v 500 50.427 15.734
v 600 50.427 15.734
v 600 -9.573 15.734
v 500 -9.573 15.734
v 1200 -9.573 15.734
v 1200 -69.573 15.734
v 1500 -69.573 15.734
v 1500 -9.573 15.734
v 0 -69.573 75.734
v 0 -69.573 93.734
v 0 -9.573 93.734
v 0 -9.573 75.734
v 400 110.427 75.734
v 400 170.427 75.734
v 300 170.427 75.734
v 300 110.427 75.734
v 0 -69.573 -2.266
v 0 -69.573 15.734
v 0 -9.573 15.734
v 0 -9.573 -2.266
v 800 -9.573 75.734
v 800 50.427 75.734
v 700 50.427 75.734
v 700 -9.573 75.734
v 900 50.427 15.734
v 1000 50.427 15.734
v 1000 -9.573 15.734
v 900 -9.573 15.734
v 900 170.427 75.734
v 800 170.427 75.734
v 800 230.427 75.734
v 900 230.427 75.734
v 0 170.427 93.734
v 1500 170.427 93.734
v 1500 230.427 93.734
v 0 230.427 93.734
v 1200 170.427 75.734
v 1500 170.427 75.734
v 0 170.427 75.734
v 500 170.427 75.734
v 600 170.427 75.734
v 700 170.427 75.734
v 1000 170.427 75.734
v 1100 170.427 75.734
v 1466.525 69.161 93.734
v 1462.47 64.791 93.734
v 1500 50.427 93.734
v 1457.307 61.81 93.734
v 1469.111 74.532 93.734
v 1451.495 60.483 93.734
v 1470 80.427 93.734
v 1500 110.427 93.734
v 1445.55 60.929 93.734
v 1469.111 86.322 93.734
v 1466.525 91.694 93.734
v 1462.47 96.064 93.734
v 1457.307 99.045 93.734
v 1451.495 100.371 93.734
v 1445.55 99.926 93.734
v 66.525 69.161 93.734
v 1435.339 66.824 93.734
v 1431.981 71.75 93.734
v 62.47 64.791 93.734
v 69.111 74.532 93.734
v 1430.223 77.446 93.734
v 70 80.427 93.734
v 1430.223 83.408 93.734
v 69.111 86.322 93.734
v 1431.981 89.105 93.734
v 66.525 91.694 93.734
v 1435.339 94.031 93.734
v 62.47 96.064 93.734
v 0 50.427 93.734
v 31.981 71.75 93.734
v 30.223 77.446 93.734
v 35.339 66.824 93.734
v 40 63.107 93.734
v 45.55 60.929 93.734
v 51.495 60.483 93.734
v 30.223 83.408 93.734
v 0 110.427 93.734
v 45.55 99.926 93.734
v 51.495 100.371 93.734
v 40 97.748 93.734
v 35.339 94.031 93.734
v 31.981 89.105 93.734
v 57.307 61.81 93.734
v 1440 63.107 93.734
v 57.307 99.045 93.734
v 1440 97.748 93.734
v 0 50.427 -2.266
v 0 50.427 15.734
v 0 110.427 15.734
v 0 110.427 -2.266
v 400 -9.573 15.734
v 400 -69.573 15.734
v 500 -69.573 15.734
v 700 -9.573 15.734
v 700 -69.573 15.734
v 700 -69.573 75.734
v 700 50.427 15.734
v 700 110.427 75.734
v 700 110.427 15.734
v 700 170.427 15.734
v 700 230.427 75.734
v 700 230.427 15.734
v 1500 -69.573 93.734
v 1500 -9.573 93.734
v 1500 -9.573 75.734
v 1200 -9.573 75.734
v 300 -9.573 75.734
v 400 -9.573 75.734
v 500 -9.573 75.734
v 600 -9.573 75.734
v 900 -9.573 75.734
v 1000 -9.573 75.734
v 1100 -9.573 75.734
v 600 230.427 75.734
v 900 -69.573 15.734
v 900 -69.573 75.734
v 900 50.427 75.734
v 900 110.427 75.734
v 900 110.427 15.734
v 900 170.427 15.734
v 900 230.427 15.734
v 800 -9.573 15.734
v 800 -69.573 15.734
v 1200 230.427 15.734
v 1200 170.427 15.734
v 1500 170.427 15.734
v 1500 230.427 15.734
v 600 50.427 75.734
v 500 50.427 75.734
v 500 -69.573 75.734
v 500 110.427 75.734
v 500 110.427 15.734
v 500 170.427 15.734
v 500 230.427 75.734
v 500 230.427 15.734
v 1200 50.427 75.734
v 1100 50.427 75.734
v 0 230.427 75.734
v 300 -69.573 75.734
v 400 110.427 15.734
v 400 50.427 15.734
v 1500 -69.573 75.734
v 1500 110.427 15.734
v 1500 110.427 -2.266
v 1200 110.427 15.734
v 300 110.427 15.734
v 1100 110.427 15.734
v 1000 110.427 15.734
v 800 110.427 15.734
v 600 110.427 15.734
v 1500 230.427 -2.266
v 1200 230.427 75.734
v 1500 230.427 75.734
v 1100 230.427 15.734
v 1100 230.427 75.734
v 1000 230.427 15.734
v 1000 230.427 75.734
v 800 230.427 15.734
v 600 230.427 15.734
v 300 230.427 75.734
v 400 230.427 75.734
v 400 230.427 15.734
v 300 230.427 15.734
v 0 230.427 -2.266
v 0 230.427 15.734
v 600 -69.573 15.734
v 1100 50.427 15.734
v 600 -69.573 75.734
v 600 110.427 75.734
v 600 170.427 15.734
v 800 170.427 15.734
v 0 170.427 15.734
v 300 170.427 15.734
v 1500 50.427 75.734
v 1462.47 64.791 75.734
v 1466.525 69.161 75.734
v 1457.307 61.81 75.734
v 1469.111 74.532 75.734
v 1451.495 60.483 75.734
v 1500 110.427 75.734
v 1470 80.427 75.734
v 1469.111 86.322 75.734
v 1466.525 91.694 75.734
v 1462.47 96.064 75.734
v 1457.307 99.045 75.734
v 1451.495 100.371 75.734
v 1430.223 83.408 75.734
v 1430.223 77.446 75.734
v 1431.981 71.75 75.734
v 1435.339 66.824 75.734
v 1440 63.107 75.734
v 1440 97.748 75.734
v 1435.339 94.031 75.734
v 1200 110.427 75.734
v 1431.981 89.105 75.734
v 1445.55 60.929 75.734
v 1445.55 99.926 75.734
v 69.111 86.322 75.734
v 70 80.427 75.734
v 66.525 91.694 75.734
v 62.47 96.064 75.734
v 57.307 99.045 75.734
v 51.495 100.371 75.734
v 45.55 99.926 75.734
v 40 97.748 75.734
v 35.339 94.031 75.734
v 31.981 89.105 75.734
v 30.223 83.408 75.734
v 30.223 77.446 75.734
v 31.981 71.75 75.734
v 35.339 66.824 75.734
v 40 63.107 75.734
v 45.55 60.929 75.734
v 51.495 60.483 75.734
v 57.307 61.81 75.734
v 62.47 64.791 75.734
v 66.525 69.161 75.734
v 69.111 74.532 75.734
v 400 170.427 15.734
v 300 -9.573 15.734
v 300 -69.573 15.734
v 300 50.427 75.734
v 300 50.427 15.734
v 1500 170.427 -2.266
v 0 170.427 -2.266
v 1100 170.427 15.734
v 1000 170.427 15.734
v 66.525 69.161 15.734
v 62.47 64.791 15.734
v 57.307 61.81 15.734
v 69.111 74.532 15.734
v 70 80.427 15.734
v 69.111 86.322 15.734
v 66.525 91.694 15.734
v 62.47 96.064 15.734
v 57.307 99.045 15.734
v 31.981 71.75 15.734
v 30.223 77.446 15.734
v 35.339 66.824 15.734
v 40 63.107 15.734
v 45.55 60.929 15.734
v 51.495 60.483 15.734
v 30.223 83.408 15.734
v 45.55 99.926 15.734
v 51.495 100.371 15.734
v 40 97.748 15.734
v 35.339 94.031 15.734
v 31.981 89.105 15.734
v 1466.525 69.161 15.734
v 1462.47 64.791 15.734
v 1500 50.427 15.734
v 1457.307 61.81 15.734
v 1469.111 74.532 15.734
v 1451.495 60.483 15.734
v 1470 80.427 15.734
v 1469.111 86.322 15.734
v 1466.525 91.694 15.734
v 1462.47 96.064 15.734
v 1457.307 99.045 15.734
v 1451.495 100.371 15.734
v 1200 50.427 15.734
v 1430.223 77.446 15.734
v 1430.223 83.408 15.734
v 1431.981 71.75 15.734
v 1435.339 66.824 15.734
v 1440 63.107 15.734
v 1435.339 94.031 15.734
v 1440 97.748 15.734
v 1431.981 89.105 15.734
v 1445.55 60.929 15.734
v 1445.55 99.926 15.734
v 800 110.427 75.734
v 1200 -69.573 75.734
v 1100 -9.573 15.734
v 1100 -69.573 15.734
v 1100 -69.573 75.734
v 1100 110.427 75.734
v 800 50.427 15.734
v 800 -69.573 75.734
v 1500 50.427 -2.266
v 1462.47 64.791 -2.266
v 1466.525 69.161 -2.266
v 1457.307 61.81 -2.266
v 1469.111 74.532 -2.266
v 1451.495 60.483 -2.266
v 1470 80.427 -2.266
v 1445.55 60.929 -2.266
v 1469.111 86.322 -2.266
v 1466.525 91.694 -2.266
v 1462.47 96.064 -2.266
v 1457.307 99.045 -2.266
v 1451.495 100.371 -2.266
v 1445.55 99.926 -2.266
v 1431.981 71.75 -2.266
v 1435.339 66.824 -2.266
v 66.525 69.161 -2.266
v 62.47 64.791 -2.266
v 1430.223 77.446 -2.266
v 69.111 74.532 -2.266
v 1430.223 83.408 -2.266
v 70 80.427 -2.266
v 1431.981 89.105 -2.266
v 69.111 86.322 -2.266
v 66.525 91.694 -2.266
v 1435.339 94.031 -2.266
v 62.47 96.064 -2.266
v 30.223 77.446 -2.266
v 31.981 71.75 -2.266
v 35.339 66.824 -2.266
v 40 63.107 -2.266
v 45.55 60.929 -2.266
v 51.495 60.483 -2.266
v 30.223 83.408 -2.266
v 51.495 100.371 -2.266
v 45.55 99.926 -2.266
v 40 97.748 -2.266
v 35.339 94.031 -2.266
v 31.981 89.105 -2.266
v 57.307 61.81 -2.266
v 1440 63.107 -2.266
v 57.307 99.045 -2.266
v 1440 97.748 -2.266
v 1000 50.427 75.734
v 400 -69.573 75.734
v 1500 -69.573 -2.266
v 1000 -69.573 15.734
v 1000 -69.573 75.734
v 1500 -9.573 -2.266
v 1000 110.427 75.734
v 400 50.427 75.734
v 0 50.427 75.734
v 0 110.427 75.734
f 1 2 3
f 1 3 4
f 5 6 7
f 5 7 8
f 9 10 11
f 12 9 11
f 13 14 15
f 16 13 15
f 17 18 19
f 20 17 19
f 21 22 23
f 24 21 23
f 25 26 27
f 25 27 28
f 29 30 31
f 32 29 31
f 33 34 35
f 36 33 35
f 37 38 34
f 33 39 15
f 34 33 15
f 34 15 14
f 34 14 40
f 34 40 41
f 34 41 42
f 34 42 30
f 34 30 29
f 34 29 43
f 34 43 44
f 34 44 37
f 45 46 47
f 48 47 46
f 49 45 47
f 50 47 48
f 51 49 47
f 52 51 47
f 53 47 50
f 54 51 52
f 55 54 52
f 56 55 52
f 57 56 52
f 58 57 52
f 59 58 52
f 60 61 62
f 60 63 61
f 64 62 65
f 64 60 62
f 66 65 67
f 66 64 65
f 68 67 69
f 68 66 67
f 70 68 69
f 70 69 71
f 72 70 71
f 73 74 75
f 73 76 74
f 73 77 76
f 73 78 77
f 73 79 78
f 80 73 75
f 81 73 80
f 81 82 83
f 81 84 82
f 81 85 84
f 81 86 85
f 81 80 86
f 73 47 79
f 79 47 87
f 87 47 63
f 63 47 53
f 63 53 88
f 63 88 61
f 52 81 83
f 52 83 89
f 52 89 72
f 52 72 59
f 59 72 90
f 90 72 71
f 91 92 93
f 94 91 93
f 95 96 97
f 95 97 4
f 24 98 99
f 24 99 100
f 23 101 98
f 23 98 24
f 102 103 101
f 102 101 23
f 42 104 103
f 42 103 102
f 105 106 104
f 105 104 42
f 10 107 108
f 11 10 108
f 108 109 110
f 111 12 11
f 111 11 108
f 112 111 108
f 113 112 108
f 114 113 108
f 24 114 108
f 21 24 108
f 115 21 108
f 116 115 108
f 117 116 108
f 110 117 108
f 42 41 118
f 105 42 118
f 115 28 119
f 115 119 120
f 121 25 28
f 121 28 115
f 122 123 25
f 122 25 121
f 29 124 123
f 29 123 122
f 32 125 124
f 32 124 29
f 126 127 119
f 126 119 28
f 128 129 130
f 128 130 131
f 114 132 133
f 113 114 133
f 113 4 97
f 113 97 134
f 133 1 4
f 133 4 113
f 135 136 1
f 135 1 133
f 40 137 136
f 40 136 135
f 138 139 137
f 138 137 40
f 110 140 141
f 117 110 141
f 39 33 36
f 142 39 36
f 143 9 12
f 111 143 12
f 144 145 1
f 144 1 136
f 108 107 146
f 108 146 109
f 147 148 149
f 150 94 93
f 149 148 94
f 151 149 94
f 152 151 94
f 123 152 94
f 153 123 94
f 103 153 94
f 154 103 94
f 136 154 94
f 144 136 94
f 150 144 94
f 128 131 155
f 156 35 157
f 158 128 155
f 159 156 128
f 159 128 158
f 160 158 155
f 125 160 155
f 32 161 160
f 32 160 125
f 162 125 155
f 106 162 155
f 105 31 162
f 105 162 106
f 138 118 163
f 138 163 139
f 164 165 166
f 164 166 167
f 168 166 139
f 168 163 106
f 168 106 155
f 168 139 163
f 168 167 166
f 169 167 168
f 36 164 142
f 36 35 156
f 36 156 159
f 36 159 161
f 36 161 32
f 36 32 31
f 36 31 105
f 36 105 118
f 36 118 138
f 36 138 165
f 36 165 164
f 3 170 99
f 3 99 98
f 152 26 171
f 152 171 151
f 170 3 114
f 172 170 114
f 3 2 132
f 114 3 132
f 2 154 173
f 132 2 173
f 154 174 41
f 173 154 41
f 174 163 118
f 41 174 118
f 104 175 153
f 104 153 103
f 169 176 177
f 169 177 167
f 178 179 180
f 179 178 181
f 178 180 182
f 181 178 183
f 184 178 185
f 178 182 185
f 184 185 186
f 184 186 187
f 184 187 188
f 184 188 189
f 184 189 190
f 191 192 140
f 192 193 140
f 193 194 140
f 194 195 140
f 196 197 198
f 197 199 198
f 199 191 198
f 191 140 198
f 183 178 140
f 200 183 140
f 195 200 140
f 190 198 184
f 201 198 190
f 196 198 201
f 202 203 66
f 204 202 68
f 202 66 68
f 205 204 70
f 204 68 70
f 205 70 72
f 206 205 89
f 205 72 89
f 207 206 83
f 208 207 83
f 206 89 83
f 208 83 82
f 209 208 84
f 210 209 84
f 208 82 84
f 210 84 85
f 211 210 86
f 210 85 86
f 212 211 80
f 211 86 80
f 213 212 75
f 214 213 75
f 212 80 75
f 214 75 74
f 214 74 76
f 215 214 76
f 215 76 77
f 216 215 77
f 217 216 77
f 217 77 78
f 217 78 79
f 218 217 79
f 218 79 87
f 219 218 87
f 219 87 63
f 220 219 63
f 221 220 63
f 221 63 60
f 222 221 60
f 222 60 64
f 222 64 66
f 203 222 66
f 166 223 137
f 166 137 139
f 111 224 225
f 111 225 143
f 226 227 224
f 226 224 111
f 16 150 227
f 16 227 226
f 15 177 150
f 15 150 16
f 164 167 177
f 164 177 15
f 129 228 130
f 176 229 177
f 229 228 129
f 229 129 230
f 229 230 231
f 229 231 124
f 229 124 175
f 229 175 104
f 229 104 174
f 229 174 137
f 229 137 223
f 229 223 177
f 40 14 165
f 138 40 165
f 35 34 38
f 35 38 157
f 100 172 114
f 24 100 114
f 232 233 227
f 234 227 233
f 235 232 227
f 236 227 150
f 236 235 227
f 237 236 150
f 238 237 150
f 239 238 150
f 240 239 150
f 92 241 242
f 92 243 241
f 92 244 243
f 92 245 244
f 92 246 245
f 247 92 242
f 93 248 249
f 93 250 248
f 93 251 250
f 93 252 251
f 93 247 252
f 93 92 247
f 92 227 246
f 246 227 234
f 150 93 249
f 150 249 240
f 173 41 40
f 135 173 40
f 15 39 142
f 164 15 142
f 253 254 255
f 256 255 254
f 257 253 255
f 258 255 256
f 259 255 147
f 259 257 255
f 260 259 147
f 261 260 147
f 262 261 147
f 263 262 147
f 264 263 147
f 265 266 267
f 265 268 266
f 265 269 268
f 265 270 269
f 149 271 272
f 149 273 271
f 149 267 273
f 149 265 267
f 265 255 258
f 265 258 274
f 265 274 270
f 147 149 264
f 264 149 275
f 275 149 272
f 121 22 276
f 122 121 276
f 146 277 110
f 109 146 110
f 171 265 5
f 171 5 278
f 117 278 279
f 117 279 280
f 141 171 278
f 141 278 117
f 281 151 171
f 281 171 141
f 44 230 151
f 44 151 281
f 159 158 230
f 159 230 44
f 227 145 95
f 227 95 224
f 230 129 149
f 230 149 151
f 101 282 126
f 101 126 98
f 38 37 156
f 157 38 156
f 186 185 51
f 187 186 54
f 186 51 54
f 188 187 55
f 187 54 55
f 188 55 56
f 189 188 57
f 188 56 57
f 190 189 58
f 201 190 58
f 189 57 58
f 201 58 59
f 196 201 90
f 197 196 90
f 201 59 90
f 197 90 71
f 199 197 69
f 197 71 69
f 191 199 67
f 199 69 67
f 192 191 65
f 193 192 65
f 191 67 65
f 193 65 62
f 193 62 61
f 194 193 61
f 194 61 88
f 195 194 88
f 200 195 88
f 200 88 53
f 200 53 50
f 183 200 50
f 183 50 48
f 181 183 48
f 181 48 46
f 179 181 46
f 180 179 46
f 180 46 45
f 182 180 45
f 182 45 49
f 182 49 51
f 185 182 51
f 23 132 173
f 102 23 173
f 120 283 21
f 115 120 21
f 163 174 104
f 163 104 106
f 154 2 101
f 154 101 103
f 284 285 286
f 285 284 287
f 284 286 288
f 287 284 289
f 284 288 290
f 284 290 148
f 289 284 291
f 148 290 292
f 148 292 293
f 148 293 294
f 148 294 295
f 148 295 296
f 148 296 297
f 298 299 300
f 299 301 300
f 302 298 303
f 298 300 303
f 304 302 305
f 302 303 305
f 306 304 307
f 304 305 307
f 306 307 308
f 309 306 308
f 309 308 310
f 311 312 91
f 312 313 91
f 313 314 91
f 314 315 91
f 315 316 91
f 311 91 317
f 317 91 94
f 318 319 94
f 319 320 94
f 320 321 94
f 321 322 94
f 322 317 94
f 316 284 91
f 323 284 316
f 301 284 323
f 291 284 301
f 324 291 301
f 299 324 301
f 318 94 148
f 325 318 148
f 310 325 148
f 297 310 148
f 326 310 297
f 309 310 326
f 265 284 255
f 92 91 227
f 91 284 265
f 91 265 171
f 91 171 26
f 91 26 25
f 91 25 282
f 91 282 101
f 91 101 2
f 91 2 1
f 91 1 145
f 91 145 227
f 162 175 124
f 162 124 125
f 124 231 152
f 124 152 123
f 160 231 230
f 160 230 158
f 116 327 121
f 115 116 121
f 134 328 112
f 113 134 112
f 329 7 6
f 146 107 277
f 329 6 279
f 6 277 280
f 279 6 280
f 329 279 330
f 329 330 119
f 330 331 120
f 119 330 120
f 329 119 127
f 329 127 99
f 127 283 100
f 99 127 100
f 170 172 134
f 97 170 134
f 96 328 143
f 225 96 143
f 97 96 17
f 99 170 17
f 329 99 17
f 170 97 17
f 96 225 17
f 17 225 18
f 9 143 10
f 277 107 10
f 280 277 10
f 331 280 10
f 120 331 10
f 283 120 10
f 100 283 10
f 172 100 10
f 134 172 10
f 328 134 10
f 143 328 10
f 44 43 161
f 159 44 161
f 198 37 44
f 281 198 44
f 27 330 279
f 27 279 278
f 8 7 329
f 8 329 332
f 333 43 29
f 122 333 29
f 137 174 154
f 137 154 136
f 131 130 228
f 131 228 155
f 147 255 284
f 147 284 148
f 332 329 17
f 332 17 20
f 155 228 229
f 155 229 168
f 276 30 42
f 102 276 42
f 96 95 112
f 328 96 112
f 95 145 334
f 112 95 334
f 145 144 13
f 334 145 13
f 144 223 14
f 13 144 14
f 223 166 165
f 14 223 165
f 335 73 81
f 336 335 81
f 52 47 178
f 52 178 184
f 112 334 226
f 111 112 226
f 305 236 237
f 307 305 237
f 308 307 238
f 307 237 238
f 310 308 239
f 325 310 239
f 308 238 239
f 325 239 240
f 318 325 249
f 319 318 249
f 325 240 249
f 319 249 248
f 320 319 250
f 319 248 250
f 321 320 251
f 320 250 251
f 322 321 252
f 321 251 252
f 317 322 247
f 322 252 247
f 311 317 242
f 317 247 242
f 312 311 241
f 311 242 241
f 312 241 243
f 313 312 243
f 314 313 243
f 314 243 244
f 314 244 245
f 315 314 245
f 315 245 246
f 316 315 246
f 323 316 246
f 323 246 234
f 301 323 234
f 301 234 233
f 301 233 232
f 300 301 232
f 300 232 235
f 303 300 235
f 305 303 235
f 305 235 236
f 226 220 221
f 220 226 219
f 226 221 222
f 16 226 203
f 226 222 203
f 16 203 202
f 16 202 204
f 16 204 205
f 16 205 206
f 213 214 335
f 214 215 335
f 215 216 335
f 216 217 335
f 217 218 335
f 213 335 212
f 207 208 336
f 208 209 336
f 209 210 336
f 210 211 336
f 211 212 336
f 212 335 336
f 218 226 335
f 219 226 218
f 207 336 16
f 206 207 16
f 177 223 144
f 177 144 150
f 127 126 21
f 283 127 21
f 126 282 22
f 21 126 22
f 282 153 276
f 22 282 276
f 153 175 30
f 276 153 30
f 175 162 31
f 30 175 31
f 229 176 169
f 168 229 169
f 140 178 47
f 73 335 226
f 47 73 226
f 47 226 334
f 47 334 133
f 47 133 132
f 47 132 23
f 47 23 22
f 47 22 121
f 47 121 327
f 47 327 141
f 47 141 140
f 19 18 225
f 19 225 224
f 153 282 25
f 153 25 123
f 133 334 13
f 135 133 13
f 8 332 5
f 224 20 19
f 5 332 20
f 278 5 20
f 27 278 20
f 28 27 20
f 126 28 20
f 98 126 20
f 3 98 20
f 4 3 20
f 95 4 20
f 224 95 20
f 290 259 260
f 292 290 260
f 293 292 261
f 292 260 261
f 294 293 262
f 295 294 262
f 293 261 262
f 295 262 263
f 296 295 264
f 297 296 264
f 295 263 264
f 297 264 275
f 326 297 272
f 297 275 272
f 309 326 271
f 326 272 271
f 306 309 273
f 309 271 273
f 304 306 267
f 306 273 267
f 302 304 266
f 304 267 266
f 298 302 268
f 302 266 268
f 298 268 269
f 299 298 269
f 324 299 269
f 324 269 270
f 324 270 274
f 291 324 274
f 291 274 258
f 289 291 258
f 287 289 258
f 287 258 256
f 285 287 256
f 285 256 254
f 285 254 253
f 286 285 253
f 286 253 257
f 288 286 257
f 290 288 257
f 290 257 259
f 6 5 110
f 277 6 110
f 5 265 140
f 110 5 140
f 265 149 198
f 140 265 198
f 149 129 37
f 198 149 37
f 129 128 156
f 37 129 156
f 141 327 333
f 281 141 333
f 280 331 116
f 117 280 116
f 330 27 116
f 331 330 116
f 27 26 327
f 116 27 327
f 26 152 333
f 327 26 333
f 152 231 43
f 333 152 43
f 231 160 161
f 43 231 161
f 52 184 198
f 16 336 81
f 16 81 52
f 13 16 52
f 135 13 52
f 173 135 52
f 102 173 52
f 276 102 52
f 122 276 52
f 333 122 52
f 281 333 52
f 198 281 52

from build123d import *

# Parameters (mm, degrees)
F0_W     = 60
F0_H     = 18
F1_DEPTH = 1500
F2_W     = 100
F2_H     = 60
F3_DEPTH = 300
F4_R     = 20
F5_DEPTH = 96


with BuildPart() as f1:
    # F0 (on Right) → F1 (new body)
    with BuildSketch(Plane.YZ):
        with Locations((-39.5727836765, 84.7336053236)):
            Rectangle(F0_W, F0_H)
    extrude(amount=F1_DEPTH)



with BuildPart() as f1b:
    # F0 (on Right) → F1, piece 2 (new body)
    with BuildSketch(Plane.YZ):
        with Locations((80.4272163235, 84.7336053236)):
            Rectangle(F0_W, F0_H)
    extrude(amount=F1_DEPTH)


with BuildPart() as f1c:
    # F0 (on Right) → F1, piece 3 (new body)
    with BuildSketch(Plane.YZ):
        with Locations((200.4272163235, 84.7336053236)):
            Rectangle(F0_W, F0_H)
    extrude(amount=F1_DEPTH)


with BuildPart() as f1d:
    # F0 (on Right) → F1, piece 4 (new body)
    with BuildSketch(Plane.YZ):
        with Locations((-39.5727836765, 6.7336053236)):
            Rectangle(F0_W, F0_H)
    extrude(amount=F1_DEPTH)


with BuildPart() as f1e:
    # F0 (on Right) → F1, piece 5 (new body)
    with BuildSketch(Plane.YZ):
        with Locations((80.4272163235, 6.7336053236)):
            Rectangle(F0_W, F0_H)
    extrude(amount=F1_DEPTH)


with BuildPart() as f1f:
    # F0 (on Right) → F1, piece 6 (new body)
    with BuildSketch(Plane.YZ):
        with Locations((200.4272163235, 6.7336053236)):
            Rectangle(F0_W, F0_H)
    extrude(amount=F1_DEPTH)


with BuildPart() as f1_1:
    add(f1.part)

    add(f1b.part)  # F3 merges F1b

    add(f1c.part)  # F3 merges F1c

    add(f1d.part)  # F3 merges F1d

    add(f1e.part)  # F3 merges F1e

    add(f1f.part)  # F3 merges F1f
    # F2 (on face) → F3 (join)
    with BuildSketch(Plane(origin=(0, 230.4272163235, 0), x_dir=(-1, 0, 0), z_dir=(0, 1, 0))):
        with Locations((-350, 45.7336053236)):
            Rectangle(F2_W, F2_H)
        with Locations((-550, 45.7336053236)):
            Rectangle(F2_W, F2_H)
        with Locations((-750, 45.7336053236)):
            Rectangle(F2_W, F2_H)
        with Locations((-950, 45.7336053236)):
            Rectangle(F2_W, F2_H)
        with Locations((-1150, 45.7336053236)):
            Rectangle(F2_W, F2_H)
    extrude(amount=-F3_DEPTH)

    # F4 (on face) → F5 (cut, through all)
    with BuildSketch(Plane.XY.offset(93.7336053236)):
        with Locations((50, 80.4272163235)):
            Circle(F4_R)
        with Locations((1450, 80.4272163235)):
            Circle(F4_R)
    extrude(amount=-F5_DEPTH, mode=Mode.SUBTRACT)


solid = f1_1.part
